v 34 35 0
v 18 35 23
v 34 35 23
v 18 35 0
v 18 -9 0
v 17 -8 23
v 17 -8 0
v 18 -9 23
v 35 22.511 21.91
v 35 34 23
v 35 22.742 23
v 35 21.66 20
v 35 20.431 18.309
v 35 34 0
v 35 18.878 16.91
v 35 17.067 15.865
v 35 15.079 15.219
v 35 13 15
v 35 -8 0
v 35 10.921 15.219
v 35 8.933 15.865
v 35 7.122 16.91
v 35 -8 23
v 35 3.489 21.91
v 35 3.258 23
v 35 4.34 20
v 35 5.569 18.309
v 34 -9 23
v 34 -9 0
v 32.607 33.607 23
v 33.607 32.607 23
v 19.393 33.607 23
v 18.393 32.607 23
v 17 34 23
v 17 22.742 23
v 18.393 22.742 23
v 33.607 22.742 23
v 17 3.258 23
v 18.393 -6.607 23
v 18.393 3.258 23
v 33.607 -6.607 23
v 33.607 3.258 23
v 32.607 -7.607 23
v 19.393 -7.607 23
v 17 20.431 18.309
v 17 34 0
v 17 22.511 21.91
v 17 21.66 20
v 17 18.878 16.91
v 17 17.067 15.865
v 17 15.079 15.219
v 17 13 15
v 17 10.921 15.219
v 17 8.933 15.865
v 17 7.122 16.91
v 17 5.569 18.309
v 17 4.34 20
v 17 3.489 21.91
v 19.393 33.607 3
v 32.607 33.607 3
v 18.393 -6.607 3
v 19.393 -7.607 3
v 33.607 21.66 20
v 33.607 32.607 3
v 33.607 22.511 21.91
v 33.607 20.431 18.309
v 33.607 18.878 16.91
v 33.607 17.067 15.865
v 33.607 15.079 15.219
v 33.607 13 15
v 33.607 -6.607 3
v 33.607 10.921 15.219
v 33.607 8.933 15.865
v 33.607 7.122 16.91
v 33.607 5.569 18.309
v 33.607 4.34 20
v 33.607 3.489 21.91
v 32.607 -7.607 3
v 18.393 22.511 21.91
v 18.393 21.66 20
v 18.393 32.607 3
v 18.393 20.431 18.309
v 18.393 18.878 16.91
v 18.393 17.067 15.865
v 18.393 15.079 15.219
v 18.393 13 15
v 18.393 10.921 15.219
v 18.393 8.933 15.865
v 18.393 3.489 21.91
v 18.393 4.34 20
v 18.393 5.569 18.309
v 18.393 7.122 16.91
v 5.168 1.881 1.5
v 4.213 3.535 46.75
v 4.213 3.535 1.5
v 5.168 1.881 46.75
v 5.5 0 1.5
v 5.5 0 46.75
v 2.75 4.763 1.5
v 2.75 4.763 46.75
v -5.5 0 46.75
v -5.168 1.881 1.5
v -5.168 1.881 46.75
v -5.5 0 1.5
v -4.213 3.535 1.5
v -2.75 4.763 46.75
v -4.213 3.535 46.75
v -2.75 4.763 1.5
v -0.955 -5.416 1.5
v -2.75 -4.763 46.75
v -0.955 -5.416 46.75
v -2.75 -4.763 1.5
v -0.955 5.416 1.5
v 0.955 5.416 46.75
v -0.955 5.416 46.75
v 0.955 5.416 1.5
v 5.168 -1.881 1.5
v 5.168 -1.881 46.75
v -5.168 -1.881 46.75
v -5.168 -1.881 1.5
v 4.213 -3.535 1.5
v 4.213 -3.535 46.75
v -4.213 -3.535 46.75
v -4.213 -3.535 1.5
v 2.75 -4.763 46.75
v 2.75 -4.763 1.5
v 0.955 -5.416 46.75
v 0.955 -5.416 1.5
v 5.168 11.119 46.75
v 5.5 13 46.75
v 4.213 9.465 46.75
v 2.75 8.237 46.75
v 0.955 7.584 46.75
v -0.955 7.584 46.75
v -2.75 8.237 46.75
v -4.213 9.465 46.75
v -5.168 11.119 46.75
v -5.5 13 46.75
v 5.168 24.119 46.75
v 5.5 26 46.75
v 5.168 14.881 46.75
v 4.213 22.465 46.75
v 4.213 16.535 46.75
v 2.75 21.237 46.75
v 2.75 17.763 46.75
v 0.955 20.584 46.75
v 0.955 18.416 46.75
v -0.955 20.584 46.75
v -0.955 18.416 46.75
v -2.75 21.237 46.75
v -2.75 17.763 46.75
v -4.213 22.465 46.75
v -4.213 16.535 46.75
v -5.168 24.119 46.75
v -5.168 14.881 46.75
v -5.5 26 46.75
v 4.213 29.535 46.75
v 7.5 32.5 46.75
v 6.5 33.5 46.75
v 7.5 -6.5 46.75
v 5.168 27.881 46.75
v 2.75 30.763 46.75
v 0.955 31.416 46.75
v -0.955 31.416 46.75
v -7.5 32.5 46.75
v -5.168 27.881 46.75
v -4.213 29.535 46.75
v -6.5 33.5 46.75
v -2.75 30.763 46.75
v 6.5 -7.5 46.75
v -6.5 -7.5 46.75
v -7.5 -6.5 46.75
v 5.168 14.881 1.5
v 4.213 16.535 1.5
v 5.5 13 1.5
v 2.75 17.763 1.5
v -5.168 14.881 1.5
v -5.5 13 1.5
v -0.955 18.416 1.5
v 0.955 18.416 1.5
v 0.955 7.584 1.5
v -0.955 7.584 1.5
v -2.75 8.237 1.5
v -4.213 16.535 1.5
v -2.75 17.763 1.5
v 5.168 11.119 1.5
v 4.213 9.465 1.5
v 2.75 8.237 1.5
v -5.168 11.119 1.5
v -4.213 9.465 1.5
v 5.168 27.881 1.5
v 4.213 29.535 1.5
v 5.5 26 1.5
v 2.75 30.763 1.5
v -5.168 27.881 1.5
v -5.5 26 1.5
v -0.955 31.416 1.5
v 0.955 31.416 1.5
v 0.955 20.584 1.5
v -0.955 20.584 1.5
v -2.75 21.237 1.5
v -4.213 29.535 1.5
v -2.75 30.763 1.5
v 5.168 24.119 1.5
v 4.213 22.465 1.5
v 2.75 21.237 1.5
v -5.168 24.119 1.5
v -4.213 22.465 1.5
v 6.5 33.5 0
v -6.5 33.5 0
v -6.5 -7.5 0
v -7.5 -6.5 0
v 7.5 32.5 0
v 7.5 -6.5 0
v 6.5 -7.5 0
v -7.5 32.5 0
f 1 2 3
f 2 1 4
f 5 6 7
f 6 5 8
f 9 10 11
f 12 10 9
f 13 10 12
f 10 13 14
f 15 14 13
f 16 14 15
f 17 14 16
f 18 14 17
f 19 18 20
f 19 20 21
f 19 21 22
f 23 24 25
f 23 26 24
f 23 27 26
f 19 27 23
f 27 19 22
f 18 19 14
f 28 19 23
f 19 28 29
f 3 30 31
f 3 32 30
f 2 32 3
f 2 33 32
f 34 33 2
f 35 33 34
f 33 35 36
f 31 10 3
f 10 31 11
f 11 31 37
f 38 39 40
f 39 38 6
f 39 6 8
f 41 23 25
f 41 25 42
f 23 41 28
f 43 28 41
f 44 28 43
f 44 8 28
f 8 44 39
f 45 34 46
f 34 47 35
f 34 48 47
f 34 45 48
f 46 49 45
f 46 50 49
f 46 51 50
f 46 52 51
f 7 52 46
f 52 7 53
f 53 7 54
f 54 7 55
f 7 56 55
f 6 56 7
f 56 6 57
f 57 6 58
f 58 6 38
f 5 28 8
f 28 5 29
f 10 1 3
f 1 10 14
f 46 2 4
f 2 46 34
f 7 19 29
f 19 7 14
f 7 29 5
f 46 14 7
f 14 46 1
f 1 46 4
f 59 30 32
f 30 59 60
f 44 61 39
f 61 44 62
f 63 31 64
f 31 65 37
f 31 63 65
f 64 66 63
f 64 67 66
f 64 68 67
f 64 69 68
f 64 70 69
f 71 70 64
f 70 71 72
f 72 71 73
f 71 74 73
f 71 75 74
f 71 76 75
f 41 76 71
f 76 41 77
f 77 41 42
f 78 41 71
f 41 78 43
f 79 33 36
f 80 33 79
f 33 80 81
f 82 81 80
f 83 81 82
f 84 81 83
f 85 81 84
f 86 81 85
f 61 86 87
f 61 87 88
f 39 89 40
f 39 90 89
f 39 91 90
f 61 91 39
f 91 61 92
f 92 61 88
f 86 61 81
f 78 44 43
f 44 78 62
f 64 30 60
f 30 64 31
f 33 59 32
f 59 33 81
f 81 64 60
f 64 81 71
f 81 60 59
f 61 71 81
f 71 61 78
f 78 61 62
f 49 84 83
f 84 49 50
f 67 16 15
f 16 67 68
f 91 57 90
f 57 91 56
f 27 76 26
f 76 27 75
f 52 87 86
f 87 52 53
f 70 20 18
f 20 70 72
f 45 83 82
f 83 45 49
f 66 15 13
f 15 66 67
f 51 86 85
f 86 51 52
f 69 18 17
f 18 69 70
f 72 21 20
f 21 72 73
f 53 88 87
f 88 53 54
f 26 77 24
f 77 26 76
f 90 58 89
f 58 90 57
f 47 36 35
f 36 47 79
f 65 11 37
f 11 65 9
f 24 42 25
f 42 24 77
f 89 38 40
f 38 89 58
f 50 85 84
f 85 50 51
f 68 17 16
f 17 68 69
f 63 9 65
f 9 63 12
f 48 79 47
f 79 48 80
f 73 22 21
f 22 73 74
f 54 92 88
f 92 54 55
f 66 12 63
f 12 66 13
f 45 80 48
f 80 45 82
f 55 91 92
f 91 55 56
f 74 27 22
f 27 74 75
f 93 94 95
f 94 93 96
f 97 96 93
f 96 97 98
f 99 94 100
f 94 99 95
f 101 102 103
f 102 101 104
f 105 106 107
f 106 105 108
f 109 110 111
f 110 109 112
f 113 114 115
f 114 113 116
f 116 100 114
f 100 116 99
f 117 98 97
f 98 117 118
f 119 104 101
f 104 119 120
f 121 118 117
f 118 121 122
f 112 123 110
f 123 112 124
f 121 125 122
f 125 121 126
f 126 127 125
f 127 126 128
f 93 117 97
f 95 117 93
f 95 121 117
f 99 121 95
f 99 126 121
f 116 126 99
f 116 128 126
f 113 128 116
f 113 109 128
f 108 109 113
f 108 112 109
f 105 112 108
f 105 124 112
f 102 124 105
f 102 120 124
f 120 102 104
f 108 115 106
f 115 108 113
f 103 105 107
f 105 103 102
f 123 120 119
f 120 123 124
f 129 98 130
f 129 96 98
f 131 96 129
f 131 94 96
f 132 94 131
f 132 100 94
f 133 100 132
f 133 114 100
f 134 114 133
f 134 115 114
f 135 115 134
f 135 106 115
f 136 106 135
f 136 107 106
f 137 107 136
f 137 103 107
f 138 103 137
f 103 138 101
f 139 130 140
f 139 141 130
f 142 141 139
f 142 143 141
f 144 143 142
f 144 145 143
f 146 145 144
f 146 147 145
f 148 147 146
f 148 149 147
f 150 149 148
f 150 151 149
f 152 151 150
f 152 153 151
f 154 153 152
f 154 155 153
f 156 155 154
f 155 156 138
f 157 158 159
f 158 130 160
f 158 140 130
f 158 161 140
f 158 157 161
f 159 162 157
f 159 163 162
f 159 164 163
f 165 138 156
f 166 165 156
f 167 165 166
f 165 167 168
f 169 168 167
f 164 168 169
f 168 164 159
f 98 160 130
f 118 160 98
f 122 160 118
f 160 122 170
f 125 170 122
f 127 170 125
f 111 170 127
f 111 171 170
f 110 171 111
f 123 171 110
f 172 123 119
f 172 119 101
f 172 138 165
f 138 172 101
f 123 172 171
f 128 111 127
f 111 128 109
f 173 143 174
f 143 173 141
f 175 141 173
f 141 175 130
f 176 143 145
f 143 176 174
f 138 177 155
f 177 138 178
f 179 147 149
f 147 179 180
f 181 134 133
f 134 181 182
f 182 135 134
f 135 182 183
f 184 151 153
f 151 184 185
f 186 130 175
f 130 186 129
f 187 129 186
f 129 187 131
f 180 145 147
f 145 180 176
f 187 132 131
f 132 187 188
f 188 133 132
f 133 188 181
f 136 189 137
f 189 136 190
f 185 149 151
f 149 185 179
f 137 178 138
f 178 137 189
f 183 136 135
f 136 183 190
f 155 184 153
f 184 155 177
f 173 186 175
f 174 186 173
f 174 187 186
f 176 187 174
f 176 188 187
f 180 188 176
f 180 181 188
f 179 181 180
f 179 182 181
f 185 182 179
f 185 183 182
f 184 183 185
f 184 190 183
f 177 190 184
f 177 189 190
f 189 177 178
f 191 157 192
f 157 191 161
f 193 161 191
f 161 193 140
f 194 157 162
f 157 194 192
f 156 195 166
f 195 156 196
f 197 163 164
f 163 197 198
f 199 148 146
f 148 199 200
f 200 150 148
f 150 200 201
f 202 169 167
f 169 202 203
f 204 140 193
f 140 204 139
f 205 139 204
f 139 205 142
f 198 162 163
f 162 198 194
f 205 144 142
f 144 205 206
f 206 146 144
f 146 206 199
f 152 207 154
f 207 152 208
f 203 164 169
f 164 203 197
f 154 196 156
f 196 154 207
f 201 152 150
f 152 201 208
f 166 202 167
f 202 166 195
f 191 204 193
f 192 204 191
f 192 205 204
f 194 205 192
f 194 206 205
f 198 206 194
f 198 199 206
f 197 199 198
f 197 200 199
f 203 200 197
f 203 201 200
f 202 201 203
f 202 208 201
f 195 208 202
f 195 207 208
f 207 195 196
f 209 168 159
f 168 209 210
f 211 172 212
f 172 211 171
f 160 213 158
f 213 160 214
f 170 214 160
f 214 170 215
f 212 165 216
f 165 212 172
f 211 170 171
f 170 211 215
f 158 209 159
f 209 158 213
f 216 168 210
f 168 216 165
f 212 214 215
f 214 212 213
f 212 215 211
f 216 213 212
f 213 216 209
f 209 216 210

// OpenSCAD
// file: batteries.scad
AA=0;
AAA=1;

MAX_R = [ 17, 13 ];
MAX_H = [ 53, 50 ];
Z_OFFSET = [1.5, 7.5];
WIDTH=[15, 11];
HEIGHT=[51, 45.25];

module battery(id) {
  cylinder(h = HEIGHT[id], d = WIDTH[id]);
}
// main file
include <batteries.scad>

map = [ 
        [AAA, AAA, AAA],
        //[LR1, CR2, C],
    ];


// cap thickness
thickness=3;
// corener radius
radius=1;
// test
cap_fit=0.215;
battery_fit=0.5;
space=2;
bottom_thickness=1.5;
grip=true;


x=len(map);
y=max([for (y = map)  each(len(y))]);


maxR = max([for (x = [for (y = map)  each(y)]) WIDTH[x]]) + space; // TO WIDHT with offset and max
maxH = max([for (x = [for (y = map)  each(y)]) HEIGHT[x]]) + bottom_thickness; // TO HEIHGHT with offset and max


module base(width, depth, height, radius) {
 linear_extrude(height)
 offset(r=radius)
  square([width, depth], center=true);
}

module top(width, depth, height, radius, thickness) {
    difference() {
         linear_extrude(height/2+thickness)
         offset(r=radius)
          square([width+thickness, depth+thickness], center=true);
         
         translate([0,0,thickness])
         base(width+cap_fit, depth+cap_fit, height, radius);
    }
}

module create(id, maxH) {
 translate([0,0, maxH-HEIGHT[id]]) battery(id, battery_fit); 
}

translate([maxR*x*2, maxR*y/2-maxR/2])
difference(){
	top(maxR*x, maxR*y, 40, radius, thickness);
	if(grip) rotate([0,90,0]) translate([-25,0,-maxR*x/2-thickness/2-radius]) cylinder(maxR*x+thickness+radius*2,r=10);
}

difference(){
	translate([maxR*x/2-maxR/2, maxR*y/2-maxR/2])
	base(maxR*x, maxR*y, maxH, radius);


	for(y = [0:len(map)-1]) {
	  for(battery = [0:len(map[y])-1]) {
	      translate([y*maxR, battery*maxR, 0])  create(map[y][battery], maxH);
	  }
	}
    }
